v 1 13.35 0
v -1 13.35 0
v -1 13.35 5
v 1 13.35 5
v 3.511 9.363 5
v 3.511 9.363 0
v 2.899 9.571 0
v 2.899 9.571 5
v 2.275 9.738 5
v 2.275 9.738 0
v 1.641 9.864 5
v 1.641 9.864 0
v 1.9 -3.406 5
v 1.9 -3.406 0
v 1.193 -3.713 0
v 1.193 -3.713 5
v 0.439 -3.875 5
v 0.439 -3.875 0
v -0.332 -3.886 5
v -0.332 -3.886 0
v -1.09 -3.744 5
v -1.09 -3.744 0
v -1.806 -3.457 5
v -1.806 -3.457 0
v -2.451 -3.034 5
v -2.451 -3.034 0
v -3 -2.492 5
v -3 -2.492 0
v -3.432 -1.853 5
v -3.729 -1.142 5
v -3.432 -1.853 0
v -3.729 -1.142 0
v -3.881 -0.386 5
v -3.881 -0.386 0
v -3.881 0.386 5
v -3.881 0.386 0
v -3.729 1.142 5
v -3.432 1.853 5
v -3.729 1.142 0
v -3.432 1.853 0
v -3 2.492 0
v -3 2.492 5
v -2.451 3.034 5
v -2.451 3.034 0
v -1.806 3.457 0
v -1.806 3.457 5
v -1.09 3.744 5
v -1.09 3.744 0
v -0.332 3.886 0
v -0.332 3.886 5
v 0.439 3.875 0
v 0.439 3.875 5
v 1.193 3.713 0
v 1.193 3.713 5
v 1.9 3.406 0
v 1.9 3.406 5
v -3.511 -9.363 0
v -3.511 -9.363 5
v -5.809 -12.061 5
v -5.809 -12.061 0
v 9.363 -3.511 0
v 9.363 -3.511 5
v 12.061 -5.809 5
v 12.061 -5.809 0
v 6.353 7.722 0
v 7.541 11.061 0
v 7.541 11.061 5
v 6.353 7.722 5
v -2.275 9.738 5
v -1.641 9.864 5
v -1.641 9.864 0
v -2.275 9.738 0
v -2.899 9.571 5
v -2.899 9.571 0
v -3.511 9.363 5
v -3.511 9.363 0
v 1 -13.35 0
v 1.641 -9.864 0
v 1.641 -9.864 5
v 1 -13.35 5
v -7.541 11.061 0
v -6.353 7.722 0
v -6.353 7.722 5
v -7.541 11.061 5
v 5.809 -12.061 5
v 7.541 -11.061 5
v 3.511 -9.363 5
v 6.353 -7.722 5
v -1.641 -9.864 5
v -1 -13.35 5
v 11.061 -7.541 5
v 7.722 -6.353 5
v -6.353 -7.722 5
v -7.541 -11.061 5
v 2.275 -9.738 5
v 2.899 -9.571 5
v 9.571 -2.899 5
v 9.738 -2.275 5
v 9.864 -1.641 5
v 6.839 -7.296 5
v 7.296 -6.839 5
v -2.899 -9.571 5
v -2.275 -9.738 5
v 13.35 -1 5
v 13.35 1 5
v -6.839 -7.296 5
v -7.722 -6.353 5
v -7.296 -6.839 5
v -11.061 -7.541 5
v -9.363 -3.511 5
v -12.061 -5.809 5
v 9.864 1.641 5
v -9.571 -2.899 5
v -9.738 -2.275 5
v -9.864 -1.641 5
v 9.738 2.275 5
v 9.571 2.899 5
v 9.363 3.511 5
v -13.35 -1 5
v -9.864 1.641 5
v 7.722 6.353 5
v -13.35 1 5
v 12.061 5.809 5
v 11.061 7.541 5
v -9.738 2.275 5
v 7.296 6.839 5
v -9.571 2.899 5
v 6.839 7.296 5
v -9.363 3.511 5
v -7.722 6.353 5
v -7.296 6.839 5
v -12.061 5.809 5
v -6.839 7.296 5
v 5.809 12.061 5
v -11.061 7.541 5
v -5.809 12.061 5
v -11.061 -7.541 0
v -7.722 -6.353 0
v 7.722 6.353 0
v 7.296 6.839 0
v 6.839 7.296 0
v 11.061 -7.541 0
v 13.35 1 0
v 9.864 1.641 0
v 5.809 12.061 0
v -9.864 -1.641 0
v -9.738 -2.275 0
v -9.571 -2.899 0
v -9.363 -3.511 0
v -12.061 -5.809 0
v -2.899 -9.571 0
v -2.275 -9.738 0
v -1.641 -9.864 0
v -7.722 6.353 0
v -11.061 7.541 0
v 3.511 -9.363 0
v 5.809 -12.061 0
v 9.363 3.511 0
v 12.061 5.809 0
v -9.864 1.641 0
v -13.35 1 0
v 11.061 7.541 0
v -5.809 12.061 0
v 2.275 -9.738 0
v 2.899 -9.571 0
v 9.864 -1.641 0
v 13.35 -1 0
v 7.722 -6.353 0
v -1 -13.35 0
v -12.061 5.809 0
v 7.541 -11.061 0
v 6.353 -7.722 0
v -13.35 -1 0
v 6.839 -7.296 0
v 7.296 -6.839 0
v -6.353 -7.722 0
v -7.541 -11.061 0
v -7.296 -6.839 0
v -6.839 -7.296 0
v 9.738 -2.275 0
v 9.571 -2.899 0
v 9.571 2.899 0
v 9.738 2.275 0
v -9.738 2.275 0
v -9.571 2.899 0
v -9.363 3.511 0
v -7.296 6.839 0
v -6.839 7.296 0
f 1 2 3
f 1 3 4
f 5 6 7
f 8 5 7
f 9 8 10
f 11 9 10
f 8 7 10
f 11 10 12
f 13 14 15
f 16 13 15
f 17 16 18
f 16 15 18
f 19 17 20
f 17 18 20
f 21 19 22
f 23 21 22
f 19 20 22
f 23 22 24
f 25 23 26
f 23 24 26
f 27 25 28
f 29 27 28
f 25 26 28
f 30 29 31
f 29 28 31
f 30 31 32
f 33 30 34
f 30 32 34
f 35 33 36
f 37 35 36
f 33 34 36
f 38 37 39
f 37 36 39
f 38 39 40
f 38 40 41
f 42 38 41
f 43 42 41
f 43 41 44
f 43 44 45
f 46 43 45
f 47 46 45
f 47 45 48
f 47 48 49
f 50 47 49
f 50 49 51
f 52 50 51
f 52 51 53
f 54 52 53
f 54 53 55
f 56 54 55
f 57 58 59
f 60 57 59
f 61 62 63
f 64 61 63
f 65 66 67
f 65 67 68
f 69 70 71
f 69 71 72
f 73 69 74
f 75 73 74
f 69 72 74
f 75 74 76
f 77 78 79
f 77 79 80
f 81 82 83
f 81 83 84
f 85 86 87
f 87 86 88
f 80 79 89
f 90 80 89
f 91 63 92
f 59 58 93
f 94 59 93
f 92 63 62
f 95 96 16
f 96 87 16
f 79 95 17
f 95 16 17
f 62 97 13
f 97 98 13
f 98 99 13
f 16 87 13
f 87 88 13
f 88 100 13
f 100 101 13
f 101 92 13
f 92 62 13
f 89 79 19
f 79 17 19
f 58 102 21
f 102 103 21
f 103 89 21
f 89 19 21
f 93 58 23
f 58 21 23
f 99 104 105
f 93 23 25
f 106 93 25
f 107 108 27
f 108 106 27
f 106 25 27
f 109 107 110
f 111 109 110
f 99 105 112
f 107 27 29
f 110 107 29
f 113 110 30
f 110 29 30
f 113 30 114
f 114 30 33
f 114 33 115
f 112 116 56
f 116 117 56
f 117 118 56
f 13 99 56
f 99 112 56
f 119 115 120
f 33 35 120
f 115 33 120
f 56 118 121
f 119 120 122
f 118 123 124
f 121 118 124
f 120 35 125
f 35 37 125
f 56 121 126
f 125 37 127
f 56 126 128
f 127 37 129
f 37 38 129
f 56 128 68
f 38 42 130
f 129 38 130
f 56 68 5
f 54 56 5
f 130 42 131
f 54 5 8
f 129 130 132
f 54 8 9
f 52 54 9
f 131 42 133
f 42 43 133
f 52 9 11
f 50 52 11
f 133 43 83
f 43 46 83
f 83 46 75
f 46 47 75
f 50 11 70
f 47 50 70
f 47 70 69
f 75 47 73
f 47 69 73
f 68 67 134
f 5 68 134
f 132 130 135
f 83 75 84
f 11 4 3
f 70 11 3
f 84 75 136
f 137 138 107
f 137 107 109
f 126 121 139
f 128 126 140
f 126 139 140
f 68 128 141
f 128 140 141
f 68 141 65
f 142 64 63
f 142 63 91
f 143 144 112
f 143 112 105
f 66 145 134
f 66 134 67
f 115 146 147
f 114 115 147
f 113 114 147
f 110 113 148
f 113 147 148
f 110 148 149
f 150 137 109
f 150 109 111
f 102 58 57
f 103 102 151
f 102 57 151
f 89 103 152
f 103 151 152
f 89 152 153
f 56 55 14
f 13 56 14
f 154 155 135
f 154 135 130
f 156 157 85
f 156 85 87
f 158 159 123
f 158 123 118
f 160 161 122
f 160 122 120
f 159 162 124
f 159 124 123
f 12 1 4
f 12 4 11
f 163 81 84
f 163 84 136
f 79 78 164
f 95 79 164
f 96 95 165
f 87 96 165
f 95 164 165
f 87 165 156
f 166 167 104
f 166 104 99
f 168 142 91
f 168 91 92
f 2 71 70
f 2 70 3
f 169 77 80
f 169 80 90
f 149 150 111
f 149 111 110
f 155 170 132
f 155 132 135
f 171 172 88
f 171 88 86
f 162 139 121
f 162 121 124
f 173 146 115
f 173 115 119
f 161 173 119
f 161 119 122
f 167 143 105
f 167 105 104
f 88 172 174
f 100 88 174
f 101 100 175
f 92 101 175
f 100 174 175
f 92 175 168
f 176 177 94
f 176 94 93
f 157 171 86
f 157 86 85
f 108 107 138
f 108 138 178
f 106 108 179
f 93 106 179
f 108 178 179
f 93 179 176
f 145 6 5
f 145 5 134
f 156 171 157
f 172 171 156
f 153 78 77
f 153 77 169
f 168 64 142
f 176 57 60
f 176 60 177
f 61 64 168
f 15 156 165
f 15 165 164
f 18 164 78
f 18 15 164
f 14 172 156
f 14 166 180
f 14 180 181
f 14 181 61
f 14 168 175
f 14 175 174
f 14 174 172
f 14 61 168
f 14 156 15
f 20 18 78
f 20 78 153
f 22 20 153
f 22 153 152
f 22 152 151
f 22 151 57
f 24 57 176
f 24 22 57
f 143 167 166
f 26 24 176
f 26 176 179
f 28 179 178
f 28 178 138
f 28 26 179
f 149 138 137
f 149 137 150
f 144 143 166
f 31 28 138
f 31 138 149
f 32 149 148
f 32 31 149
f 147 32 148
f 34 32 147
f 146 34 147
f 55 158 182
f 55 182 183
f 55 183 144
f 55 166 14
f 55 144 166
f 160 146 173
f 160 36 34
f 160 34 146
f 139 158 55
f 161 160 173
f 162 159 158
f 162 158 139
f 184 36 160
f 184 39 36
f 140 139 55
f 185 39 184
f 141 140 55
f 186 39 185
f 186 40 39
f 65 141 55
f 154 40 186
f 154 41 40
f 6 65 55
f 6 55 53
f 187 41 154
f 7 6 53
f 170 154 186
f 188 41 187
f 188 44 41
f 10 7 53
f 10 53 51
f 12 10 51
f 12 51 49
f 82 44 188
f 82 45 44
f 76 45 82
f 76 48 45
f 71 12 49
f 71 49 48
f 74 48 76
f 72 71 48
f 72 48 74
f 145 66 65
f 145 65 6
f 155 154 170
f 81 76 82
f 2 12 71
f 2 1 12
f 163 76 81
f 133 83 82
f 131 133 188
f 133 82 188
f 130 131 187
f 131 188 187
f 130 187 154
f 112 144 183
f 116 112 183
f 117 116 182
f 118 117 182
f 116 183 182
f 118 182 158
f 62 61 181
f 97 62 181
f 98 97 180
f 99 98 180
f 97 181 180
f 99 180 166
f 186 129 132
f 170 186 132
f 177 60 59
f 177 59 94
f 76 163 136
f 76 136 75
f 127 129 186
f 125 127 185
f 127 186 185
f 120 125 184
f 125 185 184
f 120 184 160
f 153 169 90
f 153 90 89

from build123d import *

# Parameters (mm, degrees)
SKETCH1_R           = 10
BOSS_EXTRUDE1_DEPTH = 5
BOSS_EXTRUDE2_DEPTH = 5
CIRPATTERN1_COUNT   = 12
CUT_EXTRUDE1_DEPTH  = 7


with BuildPart() as part:
    # Sketch1 → Boss-Extrude1 (new body)
    with BuildSketch(Plane.XY):
        Circle(SKETCH1_R)
    extrude(amount=BOSS_EXTRUDE1_DEPTH)

    # Sketch3 → Boss-Extrude2 (add)
    with BuildSketch(Plane.XY):
        Polygon((-1, 13.35), (1, 13.35), (1.8, 9), (-1.8, 9), align=None)
    boss_extrude2 = extrude(amount=BOSS_EXTRUDE2_DEPTH)

    # CirPattern1: Boss-Extrude2 ×12 about axis
    cirpattern1_axis = Axis((0, 0, 0), (0, 0, 1))
    for i in range(1, CIRPATTERN1_COUNT):
        add(boss_extrude2.rotate(cirpattern1_axis, i * 360 / CIRPATTERN1_COUNT))

    # Sketch4 → Cut-Extrude1 (cut)
    with BuildSketch(Plane.XY):
        with BuildLine():
            Line((1.9, 3.405877273), (1.9, -3.405877273))
            ThreePointArc((1.9, -3.405877273), (-3.9, 0), (1.9, 3.405877273))
        make_face()
    extrude(amount=CUT_EXTRUDE1_DEPTH, mode=Mode.SUBTRACT)


solid = part.part
